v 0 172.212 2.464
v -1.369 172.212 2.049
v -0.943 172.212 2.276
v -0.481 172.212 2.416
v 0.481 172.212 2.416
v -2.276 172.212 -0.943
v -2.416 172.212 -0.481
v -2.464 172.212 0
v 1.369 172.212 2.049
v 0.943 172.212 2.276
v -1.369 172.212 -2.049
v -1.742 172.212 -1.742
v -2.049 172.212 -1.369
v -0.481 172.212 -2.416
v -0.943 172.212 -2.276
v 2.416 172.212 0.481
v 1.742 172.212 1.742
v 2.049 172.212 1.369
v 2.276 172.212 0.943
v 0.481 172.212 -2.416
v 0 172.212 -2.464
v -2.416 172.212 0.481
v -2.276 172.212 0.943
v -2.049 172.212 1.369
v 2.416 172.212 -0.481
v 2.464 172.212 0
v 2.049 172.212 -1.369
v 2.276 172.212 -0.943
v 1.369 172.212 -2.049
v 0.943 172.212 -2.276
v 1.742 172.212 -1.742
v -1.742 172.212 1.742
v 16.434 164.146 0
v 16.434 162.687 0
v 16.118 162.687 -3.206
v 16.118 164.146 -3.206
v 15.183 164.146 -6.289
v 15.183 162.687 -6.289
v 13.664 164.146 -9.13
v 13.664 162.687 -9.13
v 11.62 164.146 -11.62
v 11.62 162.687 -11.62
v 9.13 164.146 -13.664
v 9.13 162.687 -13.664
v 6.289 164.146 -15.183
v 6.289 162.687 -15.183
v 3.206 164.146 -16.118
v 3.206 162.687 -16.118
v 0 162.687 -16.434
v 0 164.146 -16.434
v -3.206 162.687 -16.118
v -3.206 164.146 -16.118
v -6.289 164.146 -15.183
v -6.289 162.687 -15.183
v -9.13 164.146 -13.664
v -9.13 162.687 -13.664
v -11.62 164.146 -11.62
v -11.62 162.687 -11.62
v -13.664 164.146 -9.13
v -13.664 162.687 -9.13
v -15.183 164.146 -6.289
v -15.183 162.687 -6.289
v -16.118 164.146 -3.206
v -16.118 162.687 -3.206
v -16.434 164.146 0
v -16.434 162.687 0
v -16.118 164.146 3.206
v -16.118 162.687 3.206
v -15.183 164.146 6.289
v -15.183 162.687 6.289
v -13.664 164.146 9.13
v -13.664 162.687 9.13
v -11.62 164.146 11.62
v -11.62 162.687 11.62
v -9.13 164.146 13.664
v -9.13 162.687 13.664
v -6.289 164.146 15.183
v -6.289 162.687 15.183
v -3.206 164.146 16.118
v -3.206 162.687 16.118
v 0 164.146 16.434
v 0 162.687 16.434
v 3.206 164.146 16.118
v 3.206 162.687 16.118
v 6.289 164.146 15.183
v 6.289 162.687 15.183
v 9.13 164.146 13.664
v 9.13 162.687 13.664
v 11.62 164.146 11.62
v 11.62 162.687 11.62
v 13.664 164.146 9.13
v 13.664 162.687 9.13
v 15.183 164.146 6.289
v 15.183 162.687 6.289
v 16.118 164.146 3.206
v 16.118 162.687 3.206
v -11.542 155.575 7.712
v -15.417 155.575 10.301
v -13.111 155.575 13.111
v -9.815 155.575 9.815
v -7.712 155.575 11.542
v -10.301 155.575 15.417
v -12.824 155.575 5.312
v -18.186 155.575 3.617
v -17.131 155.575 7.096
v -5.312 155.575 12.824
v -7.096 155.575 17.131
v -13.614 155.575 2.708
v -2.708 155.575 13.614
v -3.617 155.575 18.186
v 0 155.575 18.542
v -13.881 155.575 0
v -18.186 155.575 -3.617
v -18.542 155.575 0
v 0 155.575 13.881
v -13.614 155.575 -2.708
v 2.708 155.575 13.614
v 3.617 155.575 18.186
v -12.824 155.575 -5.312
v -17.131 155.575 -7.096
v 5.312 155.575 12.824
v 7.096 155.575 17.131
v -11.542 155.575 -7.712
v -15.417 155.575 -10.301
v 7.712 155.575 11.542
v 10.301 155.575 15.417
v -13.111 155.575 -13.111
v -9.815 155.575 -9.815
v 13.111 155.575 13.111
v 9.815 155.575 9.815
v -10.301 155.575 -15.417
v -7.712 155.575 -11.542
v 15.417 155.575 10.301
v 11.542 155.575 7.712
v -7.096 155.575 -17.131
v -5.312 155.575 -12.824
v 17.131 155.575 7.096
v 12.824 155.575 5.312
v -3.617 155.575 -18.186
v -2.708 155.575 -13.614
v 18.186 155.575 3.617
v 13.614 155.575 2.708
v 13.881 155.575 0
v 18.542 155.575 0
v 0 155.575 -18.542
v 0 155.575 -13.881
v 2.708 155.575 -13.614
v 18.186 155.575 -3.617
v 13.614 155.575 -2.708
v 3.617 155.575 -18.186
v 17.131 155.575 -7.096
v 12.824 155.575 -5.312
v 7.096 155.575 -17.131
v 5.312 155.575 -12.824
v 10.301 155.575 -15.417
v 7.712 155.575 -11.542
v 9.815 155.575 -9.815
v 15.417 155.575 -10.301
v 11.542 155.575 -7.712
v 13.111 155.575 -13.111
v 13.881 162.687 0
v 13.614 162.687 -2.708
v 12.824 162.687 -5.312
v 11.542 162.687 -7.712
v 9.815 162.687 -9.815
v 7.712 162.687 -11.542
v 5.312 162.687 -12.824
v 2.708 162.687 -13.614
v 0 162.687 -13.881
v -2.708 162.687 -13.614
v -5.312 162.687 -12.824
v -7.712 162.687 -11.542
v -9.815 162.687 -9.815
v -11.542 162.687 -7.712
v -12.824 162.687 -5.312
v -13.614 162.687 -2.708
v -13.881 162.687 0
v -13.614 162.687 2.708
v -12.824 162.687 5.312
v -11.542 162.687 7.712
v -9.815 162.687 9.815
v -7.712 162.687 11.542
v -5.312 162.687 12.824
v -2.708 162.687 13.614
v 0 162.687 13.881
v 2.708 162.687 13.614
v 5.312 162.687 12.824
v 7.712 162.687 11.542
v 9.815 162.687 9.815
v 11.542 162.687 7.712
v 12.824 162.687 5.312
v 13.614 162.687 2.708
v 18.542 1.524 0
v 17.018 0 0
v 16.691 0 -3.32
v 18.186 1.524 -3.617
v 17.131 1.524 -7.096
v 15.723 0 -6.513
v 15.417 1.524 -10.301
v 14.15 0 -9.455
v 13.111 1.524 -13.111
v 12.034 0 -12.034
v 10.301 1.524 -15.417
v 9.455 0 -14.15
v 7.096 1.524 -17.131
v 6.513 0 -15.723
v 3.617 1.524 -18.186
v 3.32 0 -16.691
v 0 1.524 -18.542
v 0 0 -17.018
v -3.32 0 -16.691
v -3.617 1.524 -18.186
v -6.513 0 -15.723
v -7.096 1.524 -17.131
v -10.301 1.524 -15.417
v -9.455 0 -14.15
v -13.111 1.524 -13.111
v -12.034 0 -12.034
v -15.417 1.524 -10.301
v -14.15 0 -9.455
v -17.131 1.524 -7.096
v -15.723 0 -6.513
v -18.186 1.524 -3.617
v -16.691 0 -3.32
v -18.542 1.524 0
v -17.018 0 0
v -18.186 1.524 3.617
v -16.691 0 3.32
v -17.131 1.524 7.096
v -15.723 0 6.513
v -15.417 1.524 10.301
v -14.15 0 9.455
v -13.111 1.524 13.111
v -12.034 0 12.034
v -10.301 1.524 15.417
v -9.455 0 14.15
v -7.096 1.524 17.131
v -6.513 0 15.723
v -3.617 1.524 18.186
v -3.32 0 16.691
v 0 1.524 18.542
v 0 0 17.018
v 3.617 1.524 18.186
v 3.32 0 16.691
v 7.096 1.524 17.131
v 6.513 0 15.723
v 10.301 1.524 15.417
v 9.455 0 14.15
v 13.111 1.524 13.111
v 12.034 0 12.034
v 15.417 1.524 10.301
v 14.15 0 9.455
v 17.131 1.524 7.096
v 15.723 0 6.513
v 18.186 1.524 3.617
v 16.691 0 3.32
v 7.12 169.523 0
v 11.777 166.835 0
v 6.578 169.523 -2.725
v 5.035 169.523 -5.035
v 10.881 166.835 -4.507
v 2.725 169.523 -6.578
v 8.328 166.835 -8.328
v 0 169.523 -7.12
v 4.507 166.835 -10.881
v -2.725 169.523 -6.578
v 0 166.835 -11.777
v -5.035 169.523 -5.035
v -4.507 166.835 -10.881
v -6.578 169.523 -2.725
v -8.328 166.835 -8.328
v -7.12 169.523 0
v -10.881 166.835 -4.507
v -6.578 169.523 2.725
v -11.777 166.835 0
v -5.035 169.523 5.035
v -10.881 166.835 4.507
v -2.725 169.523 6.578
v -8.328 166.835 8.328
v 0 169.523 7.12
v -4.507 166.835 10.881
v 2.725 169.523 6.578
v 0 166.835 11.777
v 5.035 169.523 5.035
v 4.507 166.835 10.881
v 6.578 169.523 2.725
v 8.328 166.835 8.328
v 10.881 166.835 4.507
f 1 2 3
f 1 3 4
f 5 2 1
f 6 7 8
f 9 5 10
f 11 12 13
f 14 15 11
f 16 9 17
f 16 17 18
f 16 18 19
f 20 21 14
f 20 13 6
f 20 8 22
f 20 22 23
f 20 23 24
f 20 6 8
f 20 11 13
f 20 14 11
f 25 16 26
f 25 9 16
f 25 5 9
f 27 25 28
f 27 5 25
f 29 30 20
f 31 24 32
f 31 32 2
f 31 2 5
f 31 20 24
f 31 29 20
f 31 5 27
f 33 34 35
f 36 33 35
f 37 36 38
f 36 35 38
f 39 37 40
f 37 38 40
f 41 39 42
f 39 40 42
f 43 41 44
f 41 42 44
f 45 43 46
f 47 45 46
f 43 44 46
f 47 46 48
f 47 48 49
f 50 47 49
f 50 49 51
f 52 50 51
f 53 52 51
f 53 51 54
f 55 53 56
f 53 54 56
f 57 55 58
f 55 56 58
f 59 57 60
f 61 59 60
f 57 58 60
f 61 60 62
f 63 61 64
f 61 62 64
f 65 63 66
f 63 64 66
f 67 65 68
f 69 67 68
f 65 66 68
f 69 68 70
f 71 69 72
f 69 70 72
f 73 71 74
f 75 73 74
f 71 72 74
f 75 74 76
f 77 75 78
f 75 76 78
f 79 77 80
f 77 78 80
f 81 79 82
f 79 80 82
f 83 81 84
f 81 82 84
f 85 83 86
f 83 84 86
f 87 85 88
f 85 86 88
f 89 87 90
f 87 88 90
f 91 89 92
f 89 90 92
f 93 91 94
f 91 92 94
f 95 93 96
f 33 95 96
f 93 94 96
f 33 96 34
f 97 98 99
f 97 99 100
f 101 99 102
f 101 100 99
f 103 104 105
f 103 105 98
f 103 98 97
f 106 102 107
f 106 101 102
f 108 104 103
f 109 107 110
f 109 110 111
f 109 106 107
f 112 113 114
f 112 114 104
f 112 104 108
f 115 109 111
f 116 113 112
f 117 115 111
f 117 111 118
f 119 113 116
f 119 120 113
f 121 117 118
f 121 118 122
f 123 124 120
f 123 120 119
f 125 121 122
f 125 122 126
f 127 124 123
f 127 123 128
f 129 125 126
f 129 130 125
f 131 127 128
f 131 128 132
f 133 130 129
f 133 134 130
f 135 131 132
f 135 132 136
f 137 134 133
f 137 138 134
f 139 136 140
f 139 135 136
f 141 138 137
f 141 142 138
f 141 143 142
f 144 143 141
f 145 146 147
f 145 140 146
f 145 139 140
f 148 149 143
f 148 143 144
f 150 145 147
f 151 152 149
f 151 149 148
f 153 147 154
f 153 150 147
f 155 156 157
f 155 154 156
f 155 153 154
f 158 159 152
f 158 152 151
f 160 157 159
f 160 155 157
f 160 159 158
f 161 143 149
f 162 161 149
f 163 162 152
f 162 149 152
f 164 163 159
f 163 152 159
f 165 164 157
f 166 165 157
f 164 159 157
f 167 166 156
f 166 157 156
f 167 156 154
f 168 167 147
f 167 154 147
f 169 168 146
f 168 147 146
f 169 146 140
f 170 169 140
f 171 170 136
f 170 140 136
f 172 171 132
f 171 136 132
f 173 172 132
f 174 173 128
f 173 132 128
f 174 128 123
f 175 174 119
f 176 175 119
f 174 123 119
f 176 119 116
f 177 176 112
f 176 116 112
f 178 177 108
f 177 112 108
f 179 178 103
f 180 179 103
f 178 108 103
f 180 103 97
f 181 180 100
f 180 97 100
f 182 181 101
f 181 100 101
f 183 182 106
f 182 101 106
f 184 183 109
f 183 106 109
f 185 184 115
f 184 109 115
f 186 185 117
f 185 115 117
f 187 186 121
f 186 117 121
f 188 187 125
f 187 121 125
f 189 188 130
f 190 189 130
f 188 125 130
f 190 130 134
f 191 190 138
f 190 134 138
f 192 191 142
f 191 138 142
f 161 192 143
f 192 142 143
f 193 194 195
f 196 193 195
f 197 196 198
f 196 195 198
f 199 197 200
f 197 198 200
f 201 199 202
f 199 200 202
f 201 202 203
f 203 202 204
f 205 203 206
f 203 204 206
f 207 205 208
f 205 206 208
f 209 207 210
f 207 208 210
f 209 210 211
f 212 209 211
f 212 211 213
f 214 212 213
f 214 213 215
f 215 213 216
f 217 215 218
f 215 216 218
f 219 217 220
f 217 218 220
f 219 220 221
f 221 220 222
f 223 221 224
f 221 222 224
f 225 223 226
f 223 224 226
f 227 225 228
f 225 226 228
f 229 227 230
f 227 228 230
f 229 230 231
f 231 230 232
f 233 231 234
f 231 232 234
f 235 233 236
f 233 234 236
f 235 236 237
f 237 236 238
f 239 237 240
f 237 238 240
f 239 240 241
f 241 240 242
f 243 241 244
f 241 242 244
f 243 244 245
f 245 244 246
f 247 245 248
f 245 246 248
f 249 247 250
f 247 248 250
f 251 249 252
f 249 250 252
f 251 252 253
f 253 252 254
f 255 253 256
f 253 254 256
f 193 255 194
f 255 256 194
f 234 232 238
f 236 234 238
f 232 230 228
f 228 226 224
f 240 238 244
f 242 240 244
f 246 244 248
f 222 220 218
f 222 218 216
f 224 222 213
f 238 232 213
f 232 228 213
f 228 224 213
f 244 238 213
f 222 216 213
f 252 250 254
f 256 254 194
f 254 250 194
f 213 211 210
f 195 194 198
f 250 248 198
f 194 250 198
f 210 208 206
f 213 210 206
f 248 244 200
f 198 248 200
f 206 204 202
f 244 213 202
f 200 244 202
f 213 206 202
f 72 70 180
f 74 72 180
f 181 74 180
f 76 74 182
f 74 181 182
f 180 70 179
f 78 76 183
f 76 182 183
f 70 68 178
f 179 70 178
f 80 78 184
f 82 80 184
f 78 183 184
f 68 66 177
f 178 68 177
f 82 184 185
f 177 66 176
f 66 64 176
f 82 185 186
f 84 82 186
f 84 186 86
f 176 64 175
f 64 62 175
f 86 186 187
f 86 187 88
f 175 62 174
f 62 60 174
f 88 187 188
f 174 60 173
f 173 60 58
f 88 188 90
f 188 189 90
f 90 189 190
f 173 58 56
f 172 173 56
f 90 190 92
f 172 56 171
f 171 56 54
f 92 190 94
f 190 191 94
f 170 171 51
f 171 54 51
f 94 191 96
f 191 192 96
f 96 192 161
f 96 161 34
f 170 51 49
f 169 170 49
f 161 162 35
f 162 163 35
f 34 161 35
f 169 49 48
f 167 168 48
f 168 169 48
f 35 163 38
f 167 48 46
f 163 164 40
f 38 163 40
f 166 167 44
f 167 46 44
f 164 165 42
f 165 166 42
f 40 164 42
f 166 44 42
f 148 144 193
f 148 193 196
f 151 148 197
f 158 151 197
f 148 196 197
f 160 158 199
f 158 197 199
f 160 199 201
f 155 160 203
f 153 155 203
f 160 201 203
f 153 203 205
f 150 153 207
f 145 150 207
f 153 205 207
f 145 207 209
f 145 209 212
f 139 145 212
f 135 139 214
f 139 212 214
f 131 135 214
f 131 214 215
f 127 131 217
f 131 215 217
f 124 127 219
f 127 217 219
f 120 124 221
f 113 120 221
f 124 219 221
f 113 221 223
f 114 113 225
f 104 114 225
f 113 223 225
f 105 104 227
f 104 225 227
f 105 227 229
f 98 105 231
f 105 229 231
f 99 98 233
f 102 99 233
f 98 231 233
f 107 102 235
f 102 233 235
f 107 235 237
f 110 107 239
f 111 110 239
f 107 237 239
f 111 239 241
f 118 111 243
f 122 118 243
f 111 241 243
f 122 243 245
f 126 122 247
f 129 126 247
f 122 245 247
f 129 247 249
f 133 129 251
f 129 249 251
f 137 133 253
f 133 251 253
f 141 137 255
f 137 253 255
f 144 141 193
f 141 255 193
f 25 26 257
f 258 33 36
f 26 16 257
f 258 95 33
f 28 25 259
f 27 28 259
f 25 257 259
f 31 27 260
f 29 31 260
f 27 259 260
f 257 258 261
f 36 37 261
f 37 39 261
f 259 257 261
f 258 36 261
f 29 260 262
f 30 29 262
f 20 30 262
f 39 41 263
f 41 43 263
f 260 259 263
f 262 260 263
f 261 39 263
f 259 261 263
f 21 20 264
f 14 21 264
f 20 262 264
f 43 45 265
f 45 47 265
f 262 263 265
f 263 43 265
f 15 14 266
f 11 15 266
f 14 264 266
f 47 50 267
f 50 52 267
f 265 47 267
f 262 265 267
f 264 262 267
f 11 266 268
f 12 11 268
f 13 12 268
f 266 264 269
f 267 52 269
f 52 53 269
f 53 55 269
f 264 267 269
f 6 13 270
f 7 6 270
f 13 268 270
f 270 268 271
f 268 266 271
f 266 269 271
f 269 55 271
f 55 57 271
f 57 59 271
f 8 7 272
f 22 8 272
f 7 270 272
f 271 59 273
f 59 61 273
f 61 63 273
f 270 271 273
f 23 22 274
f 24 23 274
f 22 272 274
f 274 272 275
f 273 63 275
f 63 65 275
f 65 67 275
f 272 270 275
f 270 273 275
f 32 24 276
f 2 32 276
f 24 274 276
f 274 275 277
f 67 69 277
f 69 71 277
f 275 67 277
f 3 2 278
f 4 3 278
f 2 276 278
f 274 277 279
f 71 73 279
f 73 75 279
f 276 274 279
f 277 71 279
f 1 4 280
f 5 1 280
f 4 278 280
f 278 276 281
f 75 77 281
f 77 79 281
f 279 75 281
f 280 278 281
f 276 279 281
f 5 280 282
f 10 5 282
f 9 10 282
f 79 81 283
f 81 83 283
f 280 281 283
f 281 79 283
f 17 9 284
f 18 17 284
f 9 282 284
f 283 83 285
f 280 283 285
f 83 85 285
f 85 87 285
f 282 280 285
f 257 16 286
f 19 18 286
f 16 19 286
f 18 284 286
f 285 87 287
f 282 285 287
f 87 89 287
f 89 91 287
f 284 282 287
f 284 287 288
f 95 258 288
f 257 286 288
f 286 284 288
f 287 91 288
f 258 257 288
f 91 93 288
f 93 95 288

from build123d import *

# Parameters (mm, degrees)
SKETCH1_R           = 18.542
BOSS_EXTRUDE1_DEPTH = 155.575
SKETCH2_R           = 13.8811
BOSS_EXTRUDE2_DEPTH = 7.112
SKETCH3_R           = 16.4338
BOSS_EXTRUDE3_DEPTH = 9.525
CHAMFER1_SIZE       = 13.97
CHAMFER1_SIZE2      = 8.065583261
CHAMFER2_SIZE       = 1.524


with BuildPart() as part:
    # Sketch1 → Boss-Extrude1 (new body)
    with BuildSketch(Plane(origin=(0, 0, 0), x_dir=(1, 0, 0), z_dir=(0, 1, 0))):
        Circle(SKETCH1_R)
    extrude(amount=BOSS_EXTRUDE1_DEPTH)

    # Sketch2 → Boss-Extrude2 (add)
    with BuildSketch(Plane(origin=(0, 155.575, 0), x_dir=(1, 0, 0), z_dir=(0, 1, 0))):
        Circle(SKETCH2_R)
    extrude(amount=BOSS_EXTRUDE2_DEPTH)

    # Sketch3 → Boss-Extrude3 (add)
    with BuildSketch(Plane(origin=(0, 162.687, 0), x_dir=(1, 0, 0), z_dir=(0, 1, 0))):
        Circle(SKETCH3_R)
    extrude(amount=BOSS_EXTRUDE3_DEPTH)

    # Chamfer1
    chamfer1_edges = [part.edges().sort_by_distance(p)[0] for p in [
        (-16.4338, 172.212, 0),
    ]]
    chamfer1_side = [part.faces().sort_by_distance(p)[0] for p in [
        (0, 172.212, 0),
    ]]
    chamfer(chamfer1_edges, length=CHAMFER1_SIZE, length2=CHAMFER1_SIZE2, reference=chamfer1_side[0])

    # Chamfer2
    chamfer2_edges = [part.edges().sort_by_distance(p)[0] for p in [
        (-18.542, 0, 0),
    ]]
    chamfer(chamfer2_edges, length=CHAMFER2_SIZE)


solid = part.part
